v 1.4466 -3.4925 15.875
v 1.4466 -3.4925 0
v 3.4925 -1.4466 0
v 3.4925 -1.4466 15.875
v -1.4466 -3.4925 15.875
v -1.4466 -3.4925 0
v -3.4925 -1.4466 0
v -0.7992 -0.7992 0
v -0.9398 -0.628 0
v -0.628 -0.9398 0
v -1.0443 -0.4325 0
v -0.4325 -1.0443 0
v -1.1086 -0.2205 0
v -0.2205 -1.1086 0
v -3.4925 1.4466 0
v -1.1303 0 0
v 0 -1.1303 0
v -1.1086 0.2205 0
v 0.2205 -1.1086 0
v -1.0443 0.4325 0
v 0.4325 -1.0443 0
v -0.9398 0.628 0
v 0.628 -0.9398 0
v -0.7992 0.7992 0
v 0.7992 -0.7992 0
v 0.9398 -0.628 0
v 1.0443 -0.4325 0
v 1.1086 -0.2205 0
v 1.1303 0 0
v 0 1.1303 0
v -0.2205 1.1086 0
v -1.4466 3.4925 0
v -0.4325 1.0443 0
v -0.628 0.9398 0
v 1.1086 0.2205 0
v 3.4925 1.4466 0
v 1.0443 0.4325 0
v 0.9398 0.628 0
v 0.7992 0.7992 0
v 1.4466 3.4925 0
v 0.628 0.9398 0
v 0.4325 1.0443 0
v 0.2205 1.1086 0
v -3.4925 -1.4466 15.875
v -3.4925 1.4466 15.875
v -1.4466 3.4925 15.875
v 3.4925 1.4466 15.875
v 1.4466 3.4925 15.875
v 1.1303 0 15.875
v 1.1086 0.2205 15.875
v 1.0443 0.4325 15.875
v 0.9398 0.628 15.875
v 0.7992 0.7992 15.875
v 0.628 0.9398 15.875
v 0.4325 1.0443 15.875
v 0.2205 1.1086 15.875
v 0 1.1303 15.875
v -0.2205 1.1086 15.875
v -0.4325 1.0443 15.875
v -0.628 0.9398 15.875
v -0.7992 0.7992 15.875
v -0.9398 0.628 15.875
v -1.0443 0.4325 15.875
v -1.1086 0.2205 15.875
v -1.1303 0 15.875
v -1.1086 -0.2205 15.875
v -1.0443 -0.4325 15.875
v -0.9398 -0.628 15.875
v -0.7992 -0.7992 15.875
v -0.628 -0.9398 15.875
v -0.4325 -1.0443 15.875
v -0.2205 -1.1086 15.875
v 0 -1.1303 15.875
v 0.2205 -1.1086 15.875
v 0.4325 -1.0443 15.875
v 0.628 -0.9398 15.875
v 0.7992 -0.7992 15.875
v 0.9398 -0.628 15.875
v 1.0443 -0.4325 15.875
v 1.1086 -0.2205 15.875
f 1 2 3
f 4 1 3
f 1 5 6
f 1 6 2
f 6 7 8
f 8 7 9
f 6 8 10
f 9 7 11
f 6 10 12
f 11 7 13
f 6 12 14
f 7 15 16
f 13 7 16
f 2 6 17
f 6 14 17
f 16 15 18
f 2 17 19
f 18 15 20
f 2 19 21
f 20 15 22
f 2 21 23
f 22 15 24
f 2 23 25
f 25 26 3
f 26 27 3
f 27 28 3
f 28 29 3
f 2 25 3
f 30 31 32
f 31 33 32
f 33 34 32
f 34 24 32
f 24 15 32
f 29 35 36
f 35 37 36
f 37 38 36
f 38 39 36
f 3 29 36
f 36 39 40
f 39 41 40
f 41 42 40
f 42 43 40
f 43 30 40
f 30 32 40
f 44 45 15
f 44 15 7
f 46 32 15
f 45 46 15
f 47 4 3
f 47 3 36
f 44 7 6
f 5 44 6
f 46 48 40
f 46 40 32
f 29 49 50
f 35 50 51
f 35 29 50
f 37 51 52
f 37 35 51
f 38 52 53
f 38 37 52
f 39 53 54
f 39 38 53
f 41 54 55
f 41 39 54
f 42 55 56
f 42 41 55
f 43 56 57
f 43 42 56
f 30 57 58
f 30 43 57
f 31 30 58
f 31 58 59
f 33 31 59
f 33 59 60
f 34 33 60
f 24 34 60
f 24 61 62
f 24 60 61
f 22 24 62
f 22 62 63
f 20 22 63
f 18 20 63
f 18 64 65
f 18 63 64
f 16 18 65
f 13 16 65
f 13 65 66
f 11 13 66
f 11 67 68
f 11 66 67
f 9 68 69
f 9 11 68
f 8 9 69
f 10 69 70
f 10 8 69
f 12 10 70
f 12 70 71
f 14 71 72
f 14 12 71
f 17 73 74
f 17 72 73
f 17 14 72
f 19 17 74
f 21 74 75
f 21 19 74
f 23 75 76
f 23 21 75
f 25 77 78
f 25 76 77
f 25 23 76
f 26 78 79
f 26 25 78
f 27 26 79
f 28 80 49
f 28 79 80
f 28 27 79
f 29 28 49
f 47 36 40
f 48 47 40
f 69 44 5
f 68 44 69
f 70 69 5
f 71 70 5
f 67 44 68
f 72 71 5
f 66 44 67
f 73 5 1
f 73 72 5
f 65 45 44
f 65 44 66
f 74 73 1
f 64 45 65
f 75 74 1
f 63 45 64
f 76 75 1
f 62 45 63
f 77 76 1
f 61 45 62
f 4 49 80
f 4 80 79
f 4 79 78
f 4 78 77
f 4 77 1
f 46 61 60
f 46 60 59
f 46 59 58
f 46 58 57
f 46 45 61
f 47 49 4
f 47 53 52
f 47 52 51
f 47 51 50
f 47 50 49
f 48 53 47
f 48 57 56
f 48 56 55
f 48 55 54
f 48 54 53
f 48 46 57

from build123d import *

# Parameters (mm, degrees)
F1_DEPTH = 15.875
F2_R     = 1.1303
F3_DEPTH = 15.876


with BuildPart() as f1:
    # F0 (on Top) → F1 (new body)
    with BuildSketch(Plane.XY):
        Polygon((3.4925, 1.446641), (1.446641, 3.4925), (-1.446641, 3.4925), (-3.4925, 1.446641), (-3.4925, -1.446641), (-1.446641, -3.4925), (1.446641, -3.4925), (3.4925, -1.446641), align=None)
    extrude(amount=F1_DEPTH)

    # F2 (on Top) → F3 (cut, through all)
    with BuildSketch(Plane.XY):
        Circle(F2_R)
    extrude(amount=F3_DEPTH, mode=Mode.SUBTRACT)


solid = f1.part
